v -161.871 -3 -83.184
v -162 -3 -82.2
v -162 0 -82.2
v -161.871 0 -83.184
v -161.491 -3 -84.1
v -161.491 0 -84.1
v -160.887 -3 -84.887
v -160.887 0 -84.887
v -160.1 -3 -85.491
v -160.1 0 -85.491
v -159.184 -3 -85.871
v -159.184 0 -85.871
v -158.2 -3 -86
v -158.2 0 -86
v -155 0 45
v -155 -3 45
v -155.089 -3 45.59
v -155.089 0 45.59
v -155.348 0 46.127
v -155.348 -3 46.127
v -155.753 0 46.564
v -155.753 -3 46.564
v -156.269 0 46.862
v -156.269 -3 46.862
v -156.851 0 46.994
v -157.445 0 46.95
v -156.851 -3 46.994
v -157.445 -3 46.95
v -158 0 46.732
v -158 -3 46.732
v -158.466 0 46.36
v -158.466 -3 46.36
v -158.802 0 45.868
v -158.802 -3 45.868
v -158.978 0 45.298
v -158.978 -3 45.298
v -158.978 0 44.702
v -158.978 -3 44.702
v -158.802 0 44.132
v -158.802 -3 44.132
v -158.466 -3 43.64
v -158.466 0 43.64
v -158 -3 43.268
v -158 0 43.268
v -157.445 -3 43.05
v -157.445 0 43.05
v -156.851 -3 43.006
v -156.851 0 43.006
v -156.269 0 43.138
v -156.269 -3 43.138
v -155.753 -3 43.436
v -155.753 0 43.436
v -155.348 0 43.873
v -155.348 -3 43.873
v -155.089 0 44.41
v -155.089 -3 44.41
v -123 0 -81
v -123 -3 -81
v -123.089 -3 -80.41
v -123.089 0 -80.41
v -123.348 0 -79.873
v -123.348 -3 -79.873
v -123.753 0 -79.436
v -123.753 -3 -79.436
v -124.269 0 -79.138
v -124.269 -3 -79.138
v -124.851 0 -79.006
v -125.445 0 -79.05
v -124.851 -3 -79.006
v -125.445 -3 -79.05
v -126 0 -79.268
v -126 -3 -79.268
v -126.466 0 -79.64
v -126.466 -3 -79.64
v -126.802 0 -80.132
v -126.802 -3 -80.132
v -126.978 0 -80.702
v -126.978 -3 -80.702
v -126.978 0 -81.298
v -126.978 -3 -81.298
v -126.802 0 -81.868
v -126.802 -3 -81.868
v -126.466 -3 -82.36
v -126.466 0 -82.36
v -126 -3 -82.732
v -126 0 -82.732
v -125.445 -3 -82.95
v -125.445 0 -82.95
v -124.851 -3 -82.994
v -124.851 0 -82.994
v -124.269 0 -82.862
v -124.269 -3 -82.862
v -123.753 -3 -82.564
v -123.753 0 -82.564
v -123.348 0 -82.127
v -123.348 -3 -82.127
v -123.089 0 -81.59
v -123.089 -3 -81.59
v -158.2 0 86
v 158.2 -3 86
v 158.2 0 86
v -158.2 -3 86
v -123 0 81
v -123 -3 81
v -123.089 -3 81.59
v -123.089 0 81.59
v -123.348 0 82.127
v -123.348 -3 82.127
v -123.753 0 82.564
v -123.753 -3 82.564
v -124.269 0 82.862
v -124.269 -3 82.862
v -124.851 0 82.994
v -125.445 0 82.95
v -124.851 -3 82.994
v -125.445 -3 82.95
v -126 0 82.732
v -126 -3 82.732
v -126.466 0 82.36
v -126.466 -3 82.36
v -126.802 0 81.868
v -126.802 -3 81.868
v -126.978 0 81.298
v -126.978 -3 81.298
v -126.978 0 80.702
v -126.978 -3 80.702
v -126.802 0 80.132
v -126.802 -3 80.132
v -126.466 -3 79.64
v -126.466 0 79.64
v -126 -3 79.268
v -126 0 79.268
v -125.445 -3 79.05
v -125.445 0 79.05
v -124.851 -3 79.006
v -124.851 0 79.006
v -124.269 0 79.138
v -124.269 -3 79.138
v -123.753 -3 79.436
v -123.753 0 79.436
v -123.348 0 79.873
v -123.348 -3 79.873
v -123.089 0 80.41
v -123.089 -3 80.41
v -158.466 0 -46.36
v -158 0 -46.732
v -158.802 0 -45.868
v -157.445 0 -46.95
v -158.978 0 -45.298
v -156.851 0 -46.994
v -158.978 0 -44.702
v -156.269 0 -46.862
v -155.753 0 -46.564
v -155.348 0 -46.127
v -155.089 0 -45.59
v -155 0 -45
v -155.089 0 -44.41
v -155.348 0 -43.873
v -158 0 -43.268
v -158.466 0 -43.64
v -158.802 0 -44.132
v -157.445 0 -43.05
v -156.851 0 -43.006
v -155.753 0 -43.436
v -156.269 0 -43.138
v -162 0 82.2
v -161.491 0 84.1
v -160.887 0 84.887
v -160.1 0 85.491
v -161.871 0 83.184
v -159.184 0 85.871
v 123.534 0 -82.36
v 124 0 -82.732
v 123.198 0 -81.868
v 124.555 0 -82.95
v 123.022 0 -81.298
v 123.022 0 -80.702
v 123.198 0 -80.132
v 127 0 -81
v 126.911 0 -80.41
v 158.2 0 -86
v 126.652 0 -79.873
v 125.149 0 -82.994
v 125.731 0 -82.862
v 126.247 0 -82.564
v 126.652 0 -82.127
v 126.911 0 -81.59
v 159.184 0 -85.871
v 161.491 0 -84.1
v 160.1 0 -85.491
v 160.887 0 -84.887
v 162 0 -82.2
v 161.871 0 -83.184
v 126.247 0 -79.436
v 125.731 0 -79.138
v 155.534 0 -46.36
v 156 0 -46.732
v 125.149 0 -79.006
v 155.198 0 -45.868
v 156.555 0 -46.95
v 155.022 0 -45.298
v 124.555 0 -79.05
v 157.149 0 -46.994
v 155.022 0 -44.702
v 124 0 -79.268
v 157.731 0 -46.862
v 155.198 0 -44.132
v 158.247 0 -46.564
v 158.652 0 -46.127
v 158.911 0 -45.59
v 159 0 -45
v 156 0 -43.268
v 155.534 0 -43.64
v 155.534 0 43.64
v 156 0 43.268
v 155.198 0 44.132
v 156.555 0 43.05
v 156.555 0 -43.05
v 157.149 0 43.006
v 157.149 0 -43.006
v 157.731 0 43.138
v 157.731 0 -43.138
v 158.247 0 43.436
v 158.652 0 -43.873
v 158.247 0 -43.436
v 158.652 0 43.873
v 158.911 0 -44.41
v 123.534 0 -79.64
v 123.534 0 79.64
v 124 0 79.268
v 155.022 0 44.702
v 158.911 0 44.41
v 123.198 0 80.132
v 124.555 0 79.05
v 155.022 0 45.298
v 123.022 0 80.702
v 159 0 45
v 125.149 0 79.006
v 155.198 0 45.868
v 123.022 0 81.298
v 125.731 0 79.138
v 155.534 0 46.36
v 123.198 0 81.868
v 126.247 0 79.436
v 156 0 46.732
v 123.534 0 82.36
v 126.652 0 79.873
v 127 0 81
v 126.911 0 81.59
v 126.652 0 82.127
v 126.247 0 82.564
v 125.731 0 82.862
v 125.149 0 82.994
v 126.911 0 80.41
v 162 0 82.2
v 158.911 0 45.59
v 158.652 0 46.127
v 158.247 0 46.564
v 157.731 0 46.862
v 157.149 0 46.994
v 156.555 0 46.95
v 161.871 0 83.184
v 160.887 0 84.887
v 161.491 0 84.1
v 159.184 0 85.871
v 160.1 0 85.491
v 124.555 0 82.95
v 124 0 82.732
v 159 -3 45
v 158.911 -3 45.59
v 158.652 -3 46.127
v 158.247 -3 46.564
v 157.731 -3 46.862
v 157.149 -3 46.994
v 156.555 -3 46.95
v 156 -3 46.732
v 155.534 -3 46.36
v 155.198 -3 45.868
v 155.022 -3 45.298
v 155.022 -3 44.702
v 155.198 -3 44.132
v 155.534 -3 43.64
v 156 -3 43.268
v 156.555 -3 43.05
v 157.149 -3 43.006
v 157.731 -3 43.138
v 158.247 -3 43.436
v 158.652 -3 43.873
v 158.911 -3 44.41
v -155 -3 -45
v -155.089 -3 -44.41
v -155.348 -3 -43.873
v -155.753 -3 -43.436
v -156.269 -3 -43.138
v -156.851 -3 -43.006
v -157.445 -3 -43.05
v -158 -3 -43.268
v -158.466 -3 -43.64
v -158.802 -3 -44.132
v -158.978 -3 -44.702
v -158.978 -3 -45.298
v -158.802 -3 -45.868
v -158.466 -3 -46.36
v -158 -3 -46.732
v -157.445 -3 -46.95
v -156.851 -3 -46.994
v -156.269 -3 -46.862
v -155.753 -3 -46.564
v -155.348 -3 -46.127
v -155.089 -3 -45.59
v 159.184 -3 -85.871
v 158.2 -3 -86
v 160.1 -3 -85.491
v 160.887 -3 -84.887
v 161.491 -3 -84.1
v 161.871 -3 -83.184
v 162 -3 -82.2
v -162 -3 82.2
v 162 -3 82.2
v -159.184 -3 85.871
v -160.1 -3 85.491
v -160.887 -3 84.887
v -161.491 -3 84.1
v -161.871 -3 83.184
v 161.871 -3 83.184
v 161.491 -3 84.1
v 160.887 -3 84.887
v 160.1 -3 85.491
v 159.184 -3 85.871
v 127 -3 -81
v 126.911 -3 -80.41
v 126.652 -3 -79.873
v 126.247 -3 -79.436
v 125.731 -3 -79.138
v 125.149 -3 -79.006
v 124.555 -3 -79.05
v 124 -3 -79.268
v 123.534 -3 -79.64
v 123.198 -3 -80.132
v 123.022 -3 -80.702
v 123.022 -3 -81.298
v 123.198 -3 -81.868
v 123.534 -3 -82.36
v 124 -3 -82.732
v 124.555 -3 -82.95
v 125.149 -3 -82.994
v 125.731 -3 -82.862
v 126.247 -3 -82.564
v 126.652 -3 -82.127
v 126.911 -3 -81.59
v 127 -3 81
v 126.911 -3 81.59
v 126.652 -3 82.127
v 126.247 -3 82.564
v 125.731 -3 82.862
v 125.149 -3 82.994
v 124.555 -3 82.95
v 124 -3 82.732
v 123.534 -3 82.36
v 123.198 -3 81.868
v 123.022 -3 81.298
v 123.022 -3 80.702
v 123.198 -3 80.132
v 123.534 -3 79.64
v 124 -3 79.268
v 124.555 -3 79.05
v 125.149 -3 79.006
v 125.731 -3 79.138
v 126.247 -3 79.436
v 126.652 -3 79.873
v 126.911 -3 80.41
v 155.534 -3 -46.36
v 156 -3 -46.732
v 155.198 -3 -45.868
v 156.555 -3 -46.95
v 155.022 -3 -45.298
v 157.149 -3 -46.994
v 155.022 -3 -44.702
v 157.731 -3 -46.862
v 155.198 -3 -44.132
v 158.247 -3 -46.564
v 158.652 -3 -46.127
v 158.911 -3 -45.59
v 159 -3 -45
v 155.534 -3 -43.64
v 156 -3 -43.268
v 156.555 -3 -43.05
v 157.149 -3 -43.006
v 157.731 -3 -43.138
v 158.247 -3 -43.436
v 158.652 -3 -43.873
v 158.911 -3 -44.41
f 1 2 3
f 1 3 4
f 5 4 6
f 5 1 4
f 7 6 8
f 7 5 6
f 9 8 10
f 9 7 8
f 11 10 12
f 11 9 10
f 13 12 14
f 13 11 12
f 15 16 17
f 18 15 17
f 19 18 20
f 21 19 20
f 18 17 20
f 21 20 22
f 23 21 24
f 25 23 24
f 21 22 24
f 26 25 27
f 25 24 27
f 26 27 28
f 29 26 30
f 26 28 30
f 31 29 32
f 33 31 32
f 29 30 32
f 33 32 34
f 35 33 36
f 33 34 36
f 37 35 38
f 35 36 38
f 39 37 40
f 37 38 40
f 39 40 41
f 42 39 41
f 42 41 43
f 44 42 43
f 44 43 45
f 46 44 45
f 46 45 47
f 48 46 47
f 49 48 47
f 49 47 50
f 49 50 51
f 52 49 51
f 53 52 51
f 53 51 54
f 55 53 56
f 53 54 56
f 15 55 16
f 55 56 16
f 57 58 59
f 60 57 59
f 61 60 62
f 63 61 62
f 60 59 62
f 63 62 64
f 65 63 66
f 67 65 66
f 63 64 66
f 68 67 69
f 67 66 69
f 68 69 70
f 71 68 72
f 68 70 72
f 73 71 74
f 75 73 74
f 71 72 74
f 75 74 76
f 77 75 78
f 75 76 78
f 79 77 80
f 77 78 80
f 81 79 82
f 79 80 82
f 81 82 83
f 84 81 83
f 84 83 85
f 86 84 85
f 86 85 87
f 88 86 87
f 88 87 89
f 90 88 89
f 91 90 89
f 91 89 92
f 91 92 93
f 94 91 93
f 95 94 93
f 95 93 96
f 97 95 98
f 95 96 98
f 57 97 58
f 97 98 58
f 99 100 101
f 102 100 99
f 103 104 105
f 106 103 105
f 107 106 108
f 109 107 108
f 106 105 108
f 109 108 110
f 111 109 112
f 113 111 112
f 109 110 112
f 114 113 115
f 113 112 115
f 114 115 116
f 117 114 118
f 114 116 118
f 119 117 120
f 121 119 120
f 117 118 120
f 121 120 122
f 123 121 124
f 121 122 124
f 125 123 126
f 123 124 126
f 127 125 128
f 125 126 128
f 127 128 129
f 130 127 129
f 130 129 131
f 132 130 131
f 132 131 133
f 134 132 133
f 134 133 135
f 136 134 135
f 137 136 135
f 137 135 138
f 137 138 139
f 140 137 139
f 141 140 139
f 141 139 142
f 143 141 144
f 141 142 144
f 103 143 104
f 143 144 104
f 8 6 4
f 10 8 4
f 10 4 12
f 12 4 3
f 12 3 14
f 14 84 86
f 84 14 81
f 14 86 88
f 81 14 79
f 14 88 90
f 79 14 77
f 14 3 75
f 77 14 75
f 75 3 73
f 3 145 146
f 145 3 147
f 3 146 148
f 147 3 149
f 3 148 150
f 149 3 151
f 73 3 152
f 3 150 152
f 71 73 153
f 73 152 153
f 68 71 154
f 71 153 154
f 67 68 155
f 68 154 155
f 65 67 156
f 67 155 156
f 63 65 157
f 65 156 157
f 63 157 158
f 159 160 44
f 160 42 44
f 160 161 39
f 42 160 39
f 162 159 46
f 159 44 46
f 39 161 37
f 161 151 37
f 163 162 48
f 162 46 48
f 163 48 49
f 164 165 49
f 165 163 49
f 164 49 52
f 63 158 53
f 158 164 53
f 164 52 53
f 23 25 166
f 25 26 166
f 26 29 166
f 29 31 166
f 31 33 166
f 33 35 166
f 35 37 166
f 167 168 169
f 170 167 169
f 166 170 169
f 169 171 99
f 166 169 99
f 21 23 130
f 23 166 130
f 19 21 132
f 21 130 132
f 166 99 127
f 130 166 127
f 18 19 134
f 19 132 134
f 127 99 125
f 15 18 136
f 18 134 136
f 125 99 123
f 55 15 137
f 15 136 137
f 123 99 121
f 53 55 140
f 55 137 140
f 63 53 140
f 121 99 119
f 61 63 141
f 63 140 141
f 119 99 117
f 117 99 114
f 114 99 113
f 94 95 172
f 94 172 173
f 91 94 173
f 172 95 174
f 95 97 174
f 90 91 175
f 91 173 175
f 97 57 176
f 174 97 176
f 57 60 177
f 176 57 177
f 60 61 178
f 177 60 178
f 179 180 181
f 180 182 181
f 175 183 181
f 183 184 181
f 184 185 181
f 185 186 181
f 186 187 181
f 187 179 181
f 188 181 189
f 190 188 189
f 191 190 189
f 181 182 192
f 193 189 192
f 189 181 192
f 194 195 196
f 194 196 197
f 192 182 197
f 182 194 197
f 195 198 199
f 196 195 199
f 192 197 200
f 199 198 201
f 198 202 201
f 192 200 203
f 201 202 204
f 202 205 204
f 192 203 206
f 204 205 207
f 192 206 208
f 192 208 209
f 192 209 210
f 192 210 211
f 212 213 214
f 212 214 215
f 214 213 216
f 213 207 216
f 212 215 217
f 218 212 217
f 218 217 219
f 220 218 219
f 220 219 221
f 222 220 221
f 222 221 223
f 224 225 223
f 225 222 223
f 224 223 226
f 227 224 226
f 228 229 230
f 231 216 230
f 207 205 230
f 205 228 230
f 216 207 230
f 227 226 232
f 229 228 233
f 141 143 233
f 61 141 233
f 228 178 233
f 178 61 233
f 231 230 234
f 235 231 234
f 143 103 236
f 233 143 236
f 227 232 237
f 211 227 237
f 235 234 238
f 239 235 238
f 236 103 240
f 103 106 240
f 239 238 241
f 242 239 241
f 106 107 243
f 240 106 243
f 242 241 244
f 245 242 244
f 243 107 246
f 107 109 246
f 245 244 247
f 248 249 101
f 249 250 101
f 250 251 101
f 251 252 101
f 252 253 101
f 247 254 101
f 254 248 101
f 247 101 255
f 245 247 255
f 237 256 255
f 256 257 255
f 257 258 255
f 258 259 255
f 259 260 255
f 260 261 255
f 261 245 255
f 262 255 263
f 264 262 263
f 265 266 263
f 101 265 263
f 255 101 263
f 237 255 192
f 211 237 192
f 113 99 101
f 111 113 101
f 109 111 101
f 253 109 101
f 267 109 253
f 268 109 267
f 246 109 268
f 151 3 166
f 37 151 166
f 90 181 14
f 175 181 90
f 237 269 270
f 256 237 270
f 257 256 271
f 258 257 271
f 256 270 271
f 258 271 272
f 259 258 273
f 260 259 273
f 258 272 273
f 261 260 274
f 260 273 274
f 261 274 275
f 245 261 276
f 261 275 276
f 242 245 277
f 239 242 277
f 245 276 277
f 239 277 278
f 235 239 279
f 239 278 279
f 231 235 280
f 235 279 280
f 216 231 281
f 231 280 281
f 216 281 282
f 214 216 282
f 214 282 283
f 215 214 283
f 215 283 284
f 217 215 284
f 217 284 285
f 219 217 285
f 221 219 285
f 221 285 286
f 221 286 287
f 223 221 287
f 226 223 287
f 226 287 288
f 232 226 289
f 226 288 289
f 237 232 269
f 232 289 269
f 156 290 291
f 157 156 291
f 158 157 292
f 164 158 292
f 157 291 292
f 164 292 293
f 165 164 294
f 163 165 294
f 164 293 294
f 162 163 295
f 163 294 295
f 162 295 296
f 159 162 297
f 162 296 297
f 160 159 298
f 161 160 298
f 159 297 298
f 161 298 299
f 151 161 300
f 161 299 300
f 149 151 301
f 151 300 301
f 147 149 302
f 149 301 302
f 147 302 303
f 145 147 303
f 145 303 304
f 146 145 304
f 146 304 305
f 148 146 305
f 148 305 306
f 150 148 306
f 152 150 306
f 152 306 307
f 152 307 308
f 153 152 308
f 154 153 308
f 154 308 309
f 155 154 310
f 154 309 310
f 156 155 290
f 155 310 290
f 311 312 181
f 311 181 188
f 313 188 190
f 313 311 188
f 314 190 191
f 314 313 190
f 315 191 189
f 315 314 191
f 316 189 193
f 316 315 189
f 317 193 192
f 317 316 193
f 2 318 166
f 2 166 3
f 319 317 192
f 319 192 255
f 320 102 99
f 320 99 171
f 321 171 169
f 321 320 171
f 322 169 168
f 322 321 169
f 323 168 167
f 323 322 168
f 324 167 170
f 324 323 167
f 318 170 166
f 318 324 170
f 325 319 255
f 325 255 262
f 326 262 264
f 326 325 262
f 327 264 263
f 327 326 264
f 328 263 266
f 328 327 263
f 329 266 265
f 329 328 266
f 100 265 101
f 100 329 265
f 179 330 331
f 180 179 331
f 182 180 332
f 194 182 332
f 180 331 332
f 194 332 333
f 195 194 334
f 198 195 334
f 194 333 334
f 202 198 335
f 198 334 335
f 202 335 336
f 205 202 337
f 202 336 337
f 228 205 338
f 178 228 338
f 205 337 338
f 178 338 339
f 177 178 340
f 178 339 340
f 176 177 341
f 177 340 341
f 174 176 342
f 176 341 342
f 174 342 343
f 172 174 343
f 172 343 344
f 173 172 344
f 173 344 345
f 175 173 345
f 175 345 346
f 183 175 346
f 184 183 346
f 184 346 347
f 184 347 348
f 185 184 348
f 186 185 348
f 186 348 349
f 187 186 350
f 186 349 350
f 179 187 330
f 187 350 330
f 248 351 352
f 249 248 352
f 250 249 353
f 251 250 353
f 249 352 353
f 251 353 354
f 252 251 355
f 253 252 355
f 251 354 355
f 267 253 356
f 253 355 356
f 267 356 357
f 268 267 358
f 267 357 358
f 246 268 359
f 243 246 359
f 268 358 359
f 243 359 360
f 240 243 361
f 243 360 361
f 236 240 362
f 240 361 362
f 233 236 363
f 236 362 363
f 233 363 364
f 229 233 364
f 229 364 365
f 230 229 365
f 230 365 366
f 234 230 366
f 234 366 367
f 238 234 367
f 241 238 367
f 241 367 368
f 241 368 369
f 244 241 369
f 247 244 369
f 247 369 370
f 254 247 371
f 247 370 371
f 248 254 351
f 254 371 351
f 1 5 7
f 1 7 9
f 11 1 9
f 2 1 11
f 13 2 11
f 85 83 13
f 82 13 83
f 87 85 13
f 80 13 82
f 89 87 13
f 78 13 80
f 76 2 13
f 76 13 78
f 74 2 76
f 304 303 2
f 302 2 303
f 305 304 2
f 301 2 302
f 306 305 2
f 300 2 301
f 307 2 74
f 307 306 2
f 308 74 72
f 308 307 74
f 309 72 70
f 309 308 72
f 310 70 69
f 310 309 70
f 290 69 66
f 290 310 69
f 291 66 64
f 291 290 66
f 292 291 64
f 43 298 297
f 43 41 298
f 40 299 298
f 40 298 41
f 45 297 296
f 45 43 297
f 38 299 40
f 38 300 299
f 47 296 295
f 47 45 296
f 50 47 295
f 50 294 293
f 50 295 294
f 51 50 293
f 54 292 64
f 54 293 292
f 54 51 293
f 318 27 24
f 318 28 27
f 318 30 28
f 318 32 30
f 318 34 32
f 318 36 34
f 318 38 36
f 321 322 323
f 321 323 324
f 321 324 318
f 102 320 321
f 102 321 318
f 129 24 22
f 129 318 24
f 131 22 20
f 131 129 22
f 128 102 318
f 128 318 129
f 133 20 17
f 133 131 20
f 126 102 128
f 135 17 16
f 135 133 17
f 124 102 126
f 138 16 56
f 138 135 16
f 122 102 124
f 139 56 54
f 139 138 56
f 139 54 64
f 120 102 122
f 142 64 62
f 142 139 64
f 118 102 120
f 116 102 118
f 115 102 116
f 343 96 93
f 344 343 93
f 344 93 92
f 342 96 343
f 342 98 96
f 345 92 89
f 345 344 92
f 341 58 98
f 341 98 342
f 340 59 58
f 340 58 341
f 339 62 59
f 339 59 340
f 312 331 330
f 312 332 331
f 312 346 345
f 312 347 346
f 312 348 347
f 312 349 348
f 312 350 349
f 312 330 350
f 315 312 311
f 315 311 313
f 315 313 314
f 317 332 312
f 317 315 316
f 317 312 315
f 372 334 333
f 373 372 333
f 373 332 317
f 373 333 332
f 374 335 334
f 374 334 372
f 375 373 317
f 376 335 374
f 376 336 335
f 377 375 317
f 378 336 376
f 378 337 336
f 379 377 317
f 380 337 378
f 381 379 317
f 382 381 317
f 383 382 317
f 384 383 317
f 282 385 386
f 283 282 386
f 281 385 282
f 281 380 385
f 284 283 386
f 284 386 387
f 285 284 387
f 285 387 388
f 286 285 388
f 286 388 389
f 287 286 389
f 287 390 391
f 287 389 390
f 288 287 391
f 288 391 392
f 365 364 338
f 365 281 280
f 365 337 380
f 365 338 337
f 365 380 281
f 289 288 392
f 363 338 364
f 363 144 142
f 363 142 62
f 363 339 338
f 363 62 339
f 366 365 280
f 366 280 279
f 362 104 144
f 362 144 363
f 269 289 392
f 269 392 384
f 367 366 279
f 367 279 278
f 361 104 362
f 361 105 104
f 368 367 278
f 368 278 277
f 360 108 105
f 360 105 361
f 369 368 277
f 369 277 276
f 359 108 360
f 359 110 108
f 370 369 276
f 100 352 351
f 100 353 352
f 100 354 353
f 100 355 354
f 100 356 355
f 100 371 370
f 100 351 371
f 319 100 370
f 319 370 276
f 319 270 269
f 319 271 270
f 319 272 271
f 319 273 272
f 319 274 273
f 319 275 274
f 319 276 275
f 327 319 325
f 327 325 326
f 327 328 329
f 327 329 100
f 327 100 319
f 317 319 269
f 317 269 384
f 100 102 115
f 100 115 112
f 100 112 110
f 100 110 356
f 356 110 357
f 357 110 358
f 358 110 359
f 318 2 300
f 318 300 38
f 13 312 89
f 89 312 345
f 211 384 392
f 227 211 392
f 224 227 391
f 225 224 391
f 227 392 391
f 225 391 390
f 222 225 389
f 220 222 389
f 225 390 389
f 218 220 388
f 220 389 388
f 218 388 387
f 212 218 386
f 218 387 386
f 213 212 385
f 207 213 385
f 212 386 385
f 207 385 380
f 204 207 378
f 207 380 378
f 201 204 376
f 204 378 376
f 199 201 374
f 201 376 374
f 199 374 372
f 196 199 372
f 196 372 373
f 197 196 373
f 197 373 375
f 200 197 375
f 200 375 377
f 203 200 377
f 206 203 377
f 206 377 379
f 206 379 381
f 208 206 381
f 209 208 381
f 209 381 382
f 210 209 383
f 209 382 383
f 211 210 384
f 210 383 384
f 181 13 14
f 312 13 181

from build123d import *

# Parameters (mm, degrees)
SKETCH_1_R      = 2
EXTRUDE_1_DEPTH = 3


with BuildPart() as part:
    # 草图1 → 凸台-拉伸1 (new body)
    with BuildSketch(Plane.XZ.offset(3)):
        with BuildLine():
            Line((162, -82.2), (162, 82.2))
            ThreePointArc((162, 82.2), (160.887005769, 84.887005769), (158.2, 86))
            Line((158.2, 86), (-158.2, 86))
            ThreePointArc((-158.2, 86), (-160.887005769, 84.887005769), (-162, 82.2))
            Line((-162, 82.2), (-162, -82.2))
            ThreePointArc((-162, -82.2), (-160.887005769, -84.887005769), (-158.2, -86))
            Line((-158.2, -86), (158.2, -86))
            ThreePointArc((158.2, -86), (160.887005769, -84.887005769), (162, -82.2))
        make_face()
        with Locations((157, 45)):
            Circle(SKETCH_1_R, mode=Mode.SUBTRACT)
        with Locations((157, -45)):
            Circle(SKETCH_1_R, mode=Mode.SUBTRACT)
        with Locations((125, -81)):
            Circle(SKETCH_1_R, mode=Mode.SUBTRACT)
        with Locations((-125, -81)):
            Circle(SKETCH_1_R, mode=Mode.SUBTRACT)
        with Locations((-157, -45)):
            Circle(SKETCH_1_R, mode=Mode.SUBTRACT)
        with Locations((-157, 45)):
            Circle(SKETCH_1_R, mode=Mode.SUBTRACT)
        with Locations((125, 81)):
            Circle(SKETCH_1_R, mode=Mode.SUBTRACT)
        with Locations((-125, 81)):
            Circle(SKETCH_1_R, mode=Mode.SUBTRACT)
    extrude(amount=-EXTRUDE_1_DEPTH)


solid = part.part
